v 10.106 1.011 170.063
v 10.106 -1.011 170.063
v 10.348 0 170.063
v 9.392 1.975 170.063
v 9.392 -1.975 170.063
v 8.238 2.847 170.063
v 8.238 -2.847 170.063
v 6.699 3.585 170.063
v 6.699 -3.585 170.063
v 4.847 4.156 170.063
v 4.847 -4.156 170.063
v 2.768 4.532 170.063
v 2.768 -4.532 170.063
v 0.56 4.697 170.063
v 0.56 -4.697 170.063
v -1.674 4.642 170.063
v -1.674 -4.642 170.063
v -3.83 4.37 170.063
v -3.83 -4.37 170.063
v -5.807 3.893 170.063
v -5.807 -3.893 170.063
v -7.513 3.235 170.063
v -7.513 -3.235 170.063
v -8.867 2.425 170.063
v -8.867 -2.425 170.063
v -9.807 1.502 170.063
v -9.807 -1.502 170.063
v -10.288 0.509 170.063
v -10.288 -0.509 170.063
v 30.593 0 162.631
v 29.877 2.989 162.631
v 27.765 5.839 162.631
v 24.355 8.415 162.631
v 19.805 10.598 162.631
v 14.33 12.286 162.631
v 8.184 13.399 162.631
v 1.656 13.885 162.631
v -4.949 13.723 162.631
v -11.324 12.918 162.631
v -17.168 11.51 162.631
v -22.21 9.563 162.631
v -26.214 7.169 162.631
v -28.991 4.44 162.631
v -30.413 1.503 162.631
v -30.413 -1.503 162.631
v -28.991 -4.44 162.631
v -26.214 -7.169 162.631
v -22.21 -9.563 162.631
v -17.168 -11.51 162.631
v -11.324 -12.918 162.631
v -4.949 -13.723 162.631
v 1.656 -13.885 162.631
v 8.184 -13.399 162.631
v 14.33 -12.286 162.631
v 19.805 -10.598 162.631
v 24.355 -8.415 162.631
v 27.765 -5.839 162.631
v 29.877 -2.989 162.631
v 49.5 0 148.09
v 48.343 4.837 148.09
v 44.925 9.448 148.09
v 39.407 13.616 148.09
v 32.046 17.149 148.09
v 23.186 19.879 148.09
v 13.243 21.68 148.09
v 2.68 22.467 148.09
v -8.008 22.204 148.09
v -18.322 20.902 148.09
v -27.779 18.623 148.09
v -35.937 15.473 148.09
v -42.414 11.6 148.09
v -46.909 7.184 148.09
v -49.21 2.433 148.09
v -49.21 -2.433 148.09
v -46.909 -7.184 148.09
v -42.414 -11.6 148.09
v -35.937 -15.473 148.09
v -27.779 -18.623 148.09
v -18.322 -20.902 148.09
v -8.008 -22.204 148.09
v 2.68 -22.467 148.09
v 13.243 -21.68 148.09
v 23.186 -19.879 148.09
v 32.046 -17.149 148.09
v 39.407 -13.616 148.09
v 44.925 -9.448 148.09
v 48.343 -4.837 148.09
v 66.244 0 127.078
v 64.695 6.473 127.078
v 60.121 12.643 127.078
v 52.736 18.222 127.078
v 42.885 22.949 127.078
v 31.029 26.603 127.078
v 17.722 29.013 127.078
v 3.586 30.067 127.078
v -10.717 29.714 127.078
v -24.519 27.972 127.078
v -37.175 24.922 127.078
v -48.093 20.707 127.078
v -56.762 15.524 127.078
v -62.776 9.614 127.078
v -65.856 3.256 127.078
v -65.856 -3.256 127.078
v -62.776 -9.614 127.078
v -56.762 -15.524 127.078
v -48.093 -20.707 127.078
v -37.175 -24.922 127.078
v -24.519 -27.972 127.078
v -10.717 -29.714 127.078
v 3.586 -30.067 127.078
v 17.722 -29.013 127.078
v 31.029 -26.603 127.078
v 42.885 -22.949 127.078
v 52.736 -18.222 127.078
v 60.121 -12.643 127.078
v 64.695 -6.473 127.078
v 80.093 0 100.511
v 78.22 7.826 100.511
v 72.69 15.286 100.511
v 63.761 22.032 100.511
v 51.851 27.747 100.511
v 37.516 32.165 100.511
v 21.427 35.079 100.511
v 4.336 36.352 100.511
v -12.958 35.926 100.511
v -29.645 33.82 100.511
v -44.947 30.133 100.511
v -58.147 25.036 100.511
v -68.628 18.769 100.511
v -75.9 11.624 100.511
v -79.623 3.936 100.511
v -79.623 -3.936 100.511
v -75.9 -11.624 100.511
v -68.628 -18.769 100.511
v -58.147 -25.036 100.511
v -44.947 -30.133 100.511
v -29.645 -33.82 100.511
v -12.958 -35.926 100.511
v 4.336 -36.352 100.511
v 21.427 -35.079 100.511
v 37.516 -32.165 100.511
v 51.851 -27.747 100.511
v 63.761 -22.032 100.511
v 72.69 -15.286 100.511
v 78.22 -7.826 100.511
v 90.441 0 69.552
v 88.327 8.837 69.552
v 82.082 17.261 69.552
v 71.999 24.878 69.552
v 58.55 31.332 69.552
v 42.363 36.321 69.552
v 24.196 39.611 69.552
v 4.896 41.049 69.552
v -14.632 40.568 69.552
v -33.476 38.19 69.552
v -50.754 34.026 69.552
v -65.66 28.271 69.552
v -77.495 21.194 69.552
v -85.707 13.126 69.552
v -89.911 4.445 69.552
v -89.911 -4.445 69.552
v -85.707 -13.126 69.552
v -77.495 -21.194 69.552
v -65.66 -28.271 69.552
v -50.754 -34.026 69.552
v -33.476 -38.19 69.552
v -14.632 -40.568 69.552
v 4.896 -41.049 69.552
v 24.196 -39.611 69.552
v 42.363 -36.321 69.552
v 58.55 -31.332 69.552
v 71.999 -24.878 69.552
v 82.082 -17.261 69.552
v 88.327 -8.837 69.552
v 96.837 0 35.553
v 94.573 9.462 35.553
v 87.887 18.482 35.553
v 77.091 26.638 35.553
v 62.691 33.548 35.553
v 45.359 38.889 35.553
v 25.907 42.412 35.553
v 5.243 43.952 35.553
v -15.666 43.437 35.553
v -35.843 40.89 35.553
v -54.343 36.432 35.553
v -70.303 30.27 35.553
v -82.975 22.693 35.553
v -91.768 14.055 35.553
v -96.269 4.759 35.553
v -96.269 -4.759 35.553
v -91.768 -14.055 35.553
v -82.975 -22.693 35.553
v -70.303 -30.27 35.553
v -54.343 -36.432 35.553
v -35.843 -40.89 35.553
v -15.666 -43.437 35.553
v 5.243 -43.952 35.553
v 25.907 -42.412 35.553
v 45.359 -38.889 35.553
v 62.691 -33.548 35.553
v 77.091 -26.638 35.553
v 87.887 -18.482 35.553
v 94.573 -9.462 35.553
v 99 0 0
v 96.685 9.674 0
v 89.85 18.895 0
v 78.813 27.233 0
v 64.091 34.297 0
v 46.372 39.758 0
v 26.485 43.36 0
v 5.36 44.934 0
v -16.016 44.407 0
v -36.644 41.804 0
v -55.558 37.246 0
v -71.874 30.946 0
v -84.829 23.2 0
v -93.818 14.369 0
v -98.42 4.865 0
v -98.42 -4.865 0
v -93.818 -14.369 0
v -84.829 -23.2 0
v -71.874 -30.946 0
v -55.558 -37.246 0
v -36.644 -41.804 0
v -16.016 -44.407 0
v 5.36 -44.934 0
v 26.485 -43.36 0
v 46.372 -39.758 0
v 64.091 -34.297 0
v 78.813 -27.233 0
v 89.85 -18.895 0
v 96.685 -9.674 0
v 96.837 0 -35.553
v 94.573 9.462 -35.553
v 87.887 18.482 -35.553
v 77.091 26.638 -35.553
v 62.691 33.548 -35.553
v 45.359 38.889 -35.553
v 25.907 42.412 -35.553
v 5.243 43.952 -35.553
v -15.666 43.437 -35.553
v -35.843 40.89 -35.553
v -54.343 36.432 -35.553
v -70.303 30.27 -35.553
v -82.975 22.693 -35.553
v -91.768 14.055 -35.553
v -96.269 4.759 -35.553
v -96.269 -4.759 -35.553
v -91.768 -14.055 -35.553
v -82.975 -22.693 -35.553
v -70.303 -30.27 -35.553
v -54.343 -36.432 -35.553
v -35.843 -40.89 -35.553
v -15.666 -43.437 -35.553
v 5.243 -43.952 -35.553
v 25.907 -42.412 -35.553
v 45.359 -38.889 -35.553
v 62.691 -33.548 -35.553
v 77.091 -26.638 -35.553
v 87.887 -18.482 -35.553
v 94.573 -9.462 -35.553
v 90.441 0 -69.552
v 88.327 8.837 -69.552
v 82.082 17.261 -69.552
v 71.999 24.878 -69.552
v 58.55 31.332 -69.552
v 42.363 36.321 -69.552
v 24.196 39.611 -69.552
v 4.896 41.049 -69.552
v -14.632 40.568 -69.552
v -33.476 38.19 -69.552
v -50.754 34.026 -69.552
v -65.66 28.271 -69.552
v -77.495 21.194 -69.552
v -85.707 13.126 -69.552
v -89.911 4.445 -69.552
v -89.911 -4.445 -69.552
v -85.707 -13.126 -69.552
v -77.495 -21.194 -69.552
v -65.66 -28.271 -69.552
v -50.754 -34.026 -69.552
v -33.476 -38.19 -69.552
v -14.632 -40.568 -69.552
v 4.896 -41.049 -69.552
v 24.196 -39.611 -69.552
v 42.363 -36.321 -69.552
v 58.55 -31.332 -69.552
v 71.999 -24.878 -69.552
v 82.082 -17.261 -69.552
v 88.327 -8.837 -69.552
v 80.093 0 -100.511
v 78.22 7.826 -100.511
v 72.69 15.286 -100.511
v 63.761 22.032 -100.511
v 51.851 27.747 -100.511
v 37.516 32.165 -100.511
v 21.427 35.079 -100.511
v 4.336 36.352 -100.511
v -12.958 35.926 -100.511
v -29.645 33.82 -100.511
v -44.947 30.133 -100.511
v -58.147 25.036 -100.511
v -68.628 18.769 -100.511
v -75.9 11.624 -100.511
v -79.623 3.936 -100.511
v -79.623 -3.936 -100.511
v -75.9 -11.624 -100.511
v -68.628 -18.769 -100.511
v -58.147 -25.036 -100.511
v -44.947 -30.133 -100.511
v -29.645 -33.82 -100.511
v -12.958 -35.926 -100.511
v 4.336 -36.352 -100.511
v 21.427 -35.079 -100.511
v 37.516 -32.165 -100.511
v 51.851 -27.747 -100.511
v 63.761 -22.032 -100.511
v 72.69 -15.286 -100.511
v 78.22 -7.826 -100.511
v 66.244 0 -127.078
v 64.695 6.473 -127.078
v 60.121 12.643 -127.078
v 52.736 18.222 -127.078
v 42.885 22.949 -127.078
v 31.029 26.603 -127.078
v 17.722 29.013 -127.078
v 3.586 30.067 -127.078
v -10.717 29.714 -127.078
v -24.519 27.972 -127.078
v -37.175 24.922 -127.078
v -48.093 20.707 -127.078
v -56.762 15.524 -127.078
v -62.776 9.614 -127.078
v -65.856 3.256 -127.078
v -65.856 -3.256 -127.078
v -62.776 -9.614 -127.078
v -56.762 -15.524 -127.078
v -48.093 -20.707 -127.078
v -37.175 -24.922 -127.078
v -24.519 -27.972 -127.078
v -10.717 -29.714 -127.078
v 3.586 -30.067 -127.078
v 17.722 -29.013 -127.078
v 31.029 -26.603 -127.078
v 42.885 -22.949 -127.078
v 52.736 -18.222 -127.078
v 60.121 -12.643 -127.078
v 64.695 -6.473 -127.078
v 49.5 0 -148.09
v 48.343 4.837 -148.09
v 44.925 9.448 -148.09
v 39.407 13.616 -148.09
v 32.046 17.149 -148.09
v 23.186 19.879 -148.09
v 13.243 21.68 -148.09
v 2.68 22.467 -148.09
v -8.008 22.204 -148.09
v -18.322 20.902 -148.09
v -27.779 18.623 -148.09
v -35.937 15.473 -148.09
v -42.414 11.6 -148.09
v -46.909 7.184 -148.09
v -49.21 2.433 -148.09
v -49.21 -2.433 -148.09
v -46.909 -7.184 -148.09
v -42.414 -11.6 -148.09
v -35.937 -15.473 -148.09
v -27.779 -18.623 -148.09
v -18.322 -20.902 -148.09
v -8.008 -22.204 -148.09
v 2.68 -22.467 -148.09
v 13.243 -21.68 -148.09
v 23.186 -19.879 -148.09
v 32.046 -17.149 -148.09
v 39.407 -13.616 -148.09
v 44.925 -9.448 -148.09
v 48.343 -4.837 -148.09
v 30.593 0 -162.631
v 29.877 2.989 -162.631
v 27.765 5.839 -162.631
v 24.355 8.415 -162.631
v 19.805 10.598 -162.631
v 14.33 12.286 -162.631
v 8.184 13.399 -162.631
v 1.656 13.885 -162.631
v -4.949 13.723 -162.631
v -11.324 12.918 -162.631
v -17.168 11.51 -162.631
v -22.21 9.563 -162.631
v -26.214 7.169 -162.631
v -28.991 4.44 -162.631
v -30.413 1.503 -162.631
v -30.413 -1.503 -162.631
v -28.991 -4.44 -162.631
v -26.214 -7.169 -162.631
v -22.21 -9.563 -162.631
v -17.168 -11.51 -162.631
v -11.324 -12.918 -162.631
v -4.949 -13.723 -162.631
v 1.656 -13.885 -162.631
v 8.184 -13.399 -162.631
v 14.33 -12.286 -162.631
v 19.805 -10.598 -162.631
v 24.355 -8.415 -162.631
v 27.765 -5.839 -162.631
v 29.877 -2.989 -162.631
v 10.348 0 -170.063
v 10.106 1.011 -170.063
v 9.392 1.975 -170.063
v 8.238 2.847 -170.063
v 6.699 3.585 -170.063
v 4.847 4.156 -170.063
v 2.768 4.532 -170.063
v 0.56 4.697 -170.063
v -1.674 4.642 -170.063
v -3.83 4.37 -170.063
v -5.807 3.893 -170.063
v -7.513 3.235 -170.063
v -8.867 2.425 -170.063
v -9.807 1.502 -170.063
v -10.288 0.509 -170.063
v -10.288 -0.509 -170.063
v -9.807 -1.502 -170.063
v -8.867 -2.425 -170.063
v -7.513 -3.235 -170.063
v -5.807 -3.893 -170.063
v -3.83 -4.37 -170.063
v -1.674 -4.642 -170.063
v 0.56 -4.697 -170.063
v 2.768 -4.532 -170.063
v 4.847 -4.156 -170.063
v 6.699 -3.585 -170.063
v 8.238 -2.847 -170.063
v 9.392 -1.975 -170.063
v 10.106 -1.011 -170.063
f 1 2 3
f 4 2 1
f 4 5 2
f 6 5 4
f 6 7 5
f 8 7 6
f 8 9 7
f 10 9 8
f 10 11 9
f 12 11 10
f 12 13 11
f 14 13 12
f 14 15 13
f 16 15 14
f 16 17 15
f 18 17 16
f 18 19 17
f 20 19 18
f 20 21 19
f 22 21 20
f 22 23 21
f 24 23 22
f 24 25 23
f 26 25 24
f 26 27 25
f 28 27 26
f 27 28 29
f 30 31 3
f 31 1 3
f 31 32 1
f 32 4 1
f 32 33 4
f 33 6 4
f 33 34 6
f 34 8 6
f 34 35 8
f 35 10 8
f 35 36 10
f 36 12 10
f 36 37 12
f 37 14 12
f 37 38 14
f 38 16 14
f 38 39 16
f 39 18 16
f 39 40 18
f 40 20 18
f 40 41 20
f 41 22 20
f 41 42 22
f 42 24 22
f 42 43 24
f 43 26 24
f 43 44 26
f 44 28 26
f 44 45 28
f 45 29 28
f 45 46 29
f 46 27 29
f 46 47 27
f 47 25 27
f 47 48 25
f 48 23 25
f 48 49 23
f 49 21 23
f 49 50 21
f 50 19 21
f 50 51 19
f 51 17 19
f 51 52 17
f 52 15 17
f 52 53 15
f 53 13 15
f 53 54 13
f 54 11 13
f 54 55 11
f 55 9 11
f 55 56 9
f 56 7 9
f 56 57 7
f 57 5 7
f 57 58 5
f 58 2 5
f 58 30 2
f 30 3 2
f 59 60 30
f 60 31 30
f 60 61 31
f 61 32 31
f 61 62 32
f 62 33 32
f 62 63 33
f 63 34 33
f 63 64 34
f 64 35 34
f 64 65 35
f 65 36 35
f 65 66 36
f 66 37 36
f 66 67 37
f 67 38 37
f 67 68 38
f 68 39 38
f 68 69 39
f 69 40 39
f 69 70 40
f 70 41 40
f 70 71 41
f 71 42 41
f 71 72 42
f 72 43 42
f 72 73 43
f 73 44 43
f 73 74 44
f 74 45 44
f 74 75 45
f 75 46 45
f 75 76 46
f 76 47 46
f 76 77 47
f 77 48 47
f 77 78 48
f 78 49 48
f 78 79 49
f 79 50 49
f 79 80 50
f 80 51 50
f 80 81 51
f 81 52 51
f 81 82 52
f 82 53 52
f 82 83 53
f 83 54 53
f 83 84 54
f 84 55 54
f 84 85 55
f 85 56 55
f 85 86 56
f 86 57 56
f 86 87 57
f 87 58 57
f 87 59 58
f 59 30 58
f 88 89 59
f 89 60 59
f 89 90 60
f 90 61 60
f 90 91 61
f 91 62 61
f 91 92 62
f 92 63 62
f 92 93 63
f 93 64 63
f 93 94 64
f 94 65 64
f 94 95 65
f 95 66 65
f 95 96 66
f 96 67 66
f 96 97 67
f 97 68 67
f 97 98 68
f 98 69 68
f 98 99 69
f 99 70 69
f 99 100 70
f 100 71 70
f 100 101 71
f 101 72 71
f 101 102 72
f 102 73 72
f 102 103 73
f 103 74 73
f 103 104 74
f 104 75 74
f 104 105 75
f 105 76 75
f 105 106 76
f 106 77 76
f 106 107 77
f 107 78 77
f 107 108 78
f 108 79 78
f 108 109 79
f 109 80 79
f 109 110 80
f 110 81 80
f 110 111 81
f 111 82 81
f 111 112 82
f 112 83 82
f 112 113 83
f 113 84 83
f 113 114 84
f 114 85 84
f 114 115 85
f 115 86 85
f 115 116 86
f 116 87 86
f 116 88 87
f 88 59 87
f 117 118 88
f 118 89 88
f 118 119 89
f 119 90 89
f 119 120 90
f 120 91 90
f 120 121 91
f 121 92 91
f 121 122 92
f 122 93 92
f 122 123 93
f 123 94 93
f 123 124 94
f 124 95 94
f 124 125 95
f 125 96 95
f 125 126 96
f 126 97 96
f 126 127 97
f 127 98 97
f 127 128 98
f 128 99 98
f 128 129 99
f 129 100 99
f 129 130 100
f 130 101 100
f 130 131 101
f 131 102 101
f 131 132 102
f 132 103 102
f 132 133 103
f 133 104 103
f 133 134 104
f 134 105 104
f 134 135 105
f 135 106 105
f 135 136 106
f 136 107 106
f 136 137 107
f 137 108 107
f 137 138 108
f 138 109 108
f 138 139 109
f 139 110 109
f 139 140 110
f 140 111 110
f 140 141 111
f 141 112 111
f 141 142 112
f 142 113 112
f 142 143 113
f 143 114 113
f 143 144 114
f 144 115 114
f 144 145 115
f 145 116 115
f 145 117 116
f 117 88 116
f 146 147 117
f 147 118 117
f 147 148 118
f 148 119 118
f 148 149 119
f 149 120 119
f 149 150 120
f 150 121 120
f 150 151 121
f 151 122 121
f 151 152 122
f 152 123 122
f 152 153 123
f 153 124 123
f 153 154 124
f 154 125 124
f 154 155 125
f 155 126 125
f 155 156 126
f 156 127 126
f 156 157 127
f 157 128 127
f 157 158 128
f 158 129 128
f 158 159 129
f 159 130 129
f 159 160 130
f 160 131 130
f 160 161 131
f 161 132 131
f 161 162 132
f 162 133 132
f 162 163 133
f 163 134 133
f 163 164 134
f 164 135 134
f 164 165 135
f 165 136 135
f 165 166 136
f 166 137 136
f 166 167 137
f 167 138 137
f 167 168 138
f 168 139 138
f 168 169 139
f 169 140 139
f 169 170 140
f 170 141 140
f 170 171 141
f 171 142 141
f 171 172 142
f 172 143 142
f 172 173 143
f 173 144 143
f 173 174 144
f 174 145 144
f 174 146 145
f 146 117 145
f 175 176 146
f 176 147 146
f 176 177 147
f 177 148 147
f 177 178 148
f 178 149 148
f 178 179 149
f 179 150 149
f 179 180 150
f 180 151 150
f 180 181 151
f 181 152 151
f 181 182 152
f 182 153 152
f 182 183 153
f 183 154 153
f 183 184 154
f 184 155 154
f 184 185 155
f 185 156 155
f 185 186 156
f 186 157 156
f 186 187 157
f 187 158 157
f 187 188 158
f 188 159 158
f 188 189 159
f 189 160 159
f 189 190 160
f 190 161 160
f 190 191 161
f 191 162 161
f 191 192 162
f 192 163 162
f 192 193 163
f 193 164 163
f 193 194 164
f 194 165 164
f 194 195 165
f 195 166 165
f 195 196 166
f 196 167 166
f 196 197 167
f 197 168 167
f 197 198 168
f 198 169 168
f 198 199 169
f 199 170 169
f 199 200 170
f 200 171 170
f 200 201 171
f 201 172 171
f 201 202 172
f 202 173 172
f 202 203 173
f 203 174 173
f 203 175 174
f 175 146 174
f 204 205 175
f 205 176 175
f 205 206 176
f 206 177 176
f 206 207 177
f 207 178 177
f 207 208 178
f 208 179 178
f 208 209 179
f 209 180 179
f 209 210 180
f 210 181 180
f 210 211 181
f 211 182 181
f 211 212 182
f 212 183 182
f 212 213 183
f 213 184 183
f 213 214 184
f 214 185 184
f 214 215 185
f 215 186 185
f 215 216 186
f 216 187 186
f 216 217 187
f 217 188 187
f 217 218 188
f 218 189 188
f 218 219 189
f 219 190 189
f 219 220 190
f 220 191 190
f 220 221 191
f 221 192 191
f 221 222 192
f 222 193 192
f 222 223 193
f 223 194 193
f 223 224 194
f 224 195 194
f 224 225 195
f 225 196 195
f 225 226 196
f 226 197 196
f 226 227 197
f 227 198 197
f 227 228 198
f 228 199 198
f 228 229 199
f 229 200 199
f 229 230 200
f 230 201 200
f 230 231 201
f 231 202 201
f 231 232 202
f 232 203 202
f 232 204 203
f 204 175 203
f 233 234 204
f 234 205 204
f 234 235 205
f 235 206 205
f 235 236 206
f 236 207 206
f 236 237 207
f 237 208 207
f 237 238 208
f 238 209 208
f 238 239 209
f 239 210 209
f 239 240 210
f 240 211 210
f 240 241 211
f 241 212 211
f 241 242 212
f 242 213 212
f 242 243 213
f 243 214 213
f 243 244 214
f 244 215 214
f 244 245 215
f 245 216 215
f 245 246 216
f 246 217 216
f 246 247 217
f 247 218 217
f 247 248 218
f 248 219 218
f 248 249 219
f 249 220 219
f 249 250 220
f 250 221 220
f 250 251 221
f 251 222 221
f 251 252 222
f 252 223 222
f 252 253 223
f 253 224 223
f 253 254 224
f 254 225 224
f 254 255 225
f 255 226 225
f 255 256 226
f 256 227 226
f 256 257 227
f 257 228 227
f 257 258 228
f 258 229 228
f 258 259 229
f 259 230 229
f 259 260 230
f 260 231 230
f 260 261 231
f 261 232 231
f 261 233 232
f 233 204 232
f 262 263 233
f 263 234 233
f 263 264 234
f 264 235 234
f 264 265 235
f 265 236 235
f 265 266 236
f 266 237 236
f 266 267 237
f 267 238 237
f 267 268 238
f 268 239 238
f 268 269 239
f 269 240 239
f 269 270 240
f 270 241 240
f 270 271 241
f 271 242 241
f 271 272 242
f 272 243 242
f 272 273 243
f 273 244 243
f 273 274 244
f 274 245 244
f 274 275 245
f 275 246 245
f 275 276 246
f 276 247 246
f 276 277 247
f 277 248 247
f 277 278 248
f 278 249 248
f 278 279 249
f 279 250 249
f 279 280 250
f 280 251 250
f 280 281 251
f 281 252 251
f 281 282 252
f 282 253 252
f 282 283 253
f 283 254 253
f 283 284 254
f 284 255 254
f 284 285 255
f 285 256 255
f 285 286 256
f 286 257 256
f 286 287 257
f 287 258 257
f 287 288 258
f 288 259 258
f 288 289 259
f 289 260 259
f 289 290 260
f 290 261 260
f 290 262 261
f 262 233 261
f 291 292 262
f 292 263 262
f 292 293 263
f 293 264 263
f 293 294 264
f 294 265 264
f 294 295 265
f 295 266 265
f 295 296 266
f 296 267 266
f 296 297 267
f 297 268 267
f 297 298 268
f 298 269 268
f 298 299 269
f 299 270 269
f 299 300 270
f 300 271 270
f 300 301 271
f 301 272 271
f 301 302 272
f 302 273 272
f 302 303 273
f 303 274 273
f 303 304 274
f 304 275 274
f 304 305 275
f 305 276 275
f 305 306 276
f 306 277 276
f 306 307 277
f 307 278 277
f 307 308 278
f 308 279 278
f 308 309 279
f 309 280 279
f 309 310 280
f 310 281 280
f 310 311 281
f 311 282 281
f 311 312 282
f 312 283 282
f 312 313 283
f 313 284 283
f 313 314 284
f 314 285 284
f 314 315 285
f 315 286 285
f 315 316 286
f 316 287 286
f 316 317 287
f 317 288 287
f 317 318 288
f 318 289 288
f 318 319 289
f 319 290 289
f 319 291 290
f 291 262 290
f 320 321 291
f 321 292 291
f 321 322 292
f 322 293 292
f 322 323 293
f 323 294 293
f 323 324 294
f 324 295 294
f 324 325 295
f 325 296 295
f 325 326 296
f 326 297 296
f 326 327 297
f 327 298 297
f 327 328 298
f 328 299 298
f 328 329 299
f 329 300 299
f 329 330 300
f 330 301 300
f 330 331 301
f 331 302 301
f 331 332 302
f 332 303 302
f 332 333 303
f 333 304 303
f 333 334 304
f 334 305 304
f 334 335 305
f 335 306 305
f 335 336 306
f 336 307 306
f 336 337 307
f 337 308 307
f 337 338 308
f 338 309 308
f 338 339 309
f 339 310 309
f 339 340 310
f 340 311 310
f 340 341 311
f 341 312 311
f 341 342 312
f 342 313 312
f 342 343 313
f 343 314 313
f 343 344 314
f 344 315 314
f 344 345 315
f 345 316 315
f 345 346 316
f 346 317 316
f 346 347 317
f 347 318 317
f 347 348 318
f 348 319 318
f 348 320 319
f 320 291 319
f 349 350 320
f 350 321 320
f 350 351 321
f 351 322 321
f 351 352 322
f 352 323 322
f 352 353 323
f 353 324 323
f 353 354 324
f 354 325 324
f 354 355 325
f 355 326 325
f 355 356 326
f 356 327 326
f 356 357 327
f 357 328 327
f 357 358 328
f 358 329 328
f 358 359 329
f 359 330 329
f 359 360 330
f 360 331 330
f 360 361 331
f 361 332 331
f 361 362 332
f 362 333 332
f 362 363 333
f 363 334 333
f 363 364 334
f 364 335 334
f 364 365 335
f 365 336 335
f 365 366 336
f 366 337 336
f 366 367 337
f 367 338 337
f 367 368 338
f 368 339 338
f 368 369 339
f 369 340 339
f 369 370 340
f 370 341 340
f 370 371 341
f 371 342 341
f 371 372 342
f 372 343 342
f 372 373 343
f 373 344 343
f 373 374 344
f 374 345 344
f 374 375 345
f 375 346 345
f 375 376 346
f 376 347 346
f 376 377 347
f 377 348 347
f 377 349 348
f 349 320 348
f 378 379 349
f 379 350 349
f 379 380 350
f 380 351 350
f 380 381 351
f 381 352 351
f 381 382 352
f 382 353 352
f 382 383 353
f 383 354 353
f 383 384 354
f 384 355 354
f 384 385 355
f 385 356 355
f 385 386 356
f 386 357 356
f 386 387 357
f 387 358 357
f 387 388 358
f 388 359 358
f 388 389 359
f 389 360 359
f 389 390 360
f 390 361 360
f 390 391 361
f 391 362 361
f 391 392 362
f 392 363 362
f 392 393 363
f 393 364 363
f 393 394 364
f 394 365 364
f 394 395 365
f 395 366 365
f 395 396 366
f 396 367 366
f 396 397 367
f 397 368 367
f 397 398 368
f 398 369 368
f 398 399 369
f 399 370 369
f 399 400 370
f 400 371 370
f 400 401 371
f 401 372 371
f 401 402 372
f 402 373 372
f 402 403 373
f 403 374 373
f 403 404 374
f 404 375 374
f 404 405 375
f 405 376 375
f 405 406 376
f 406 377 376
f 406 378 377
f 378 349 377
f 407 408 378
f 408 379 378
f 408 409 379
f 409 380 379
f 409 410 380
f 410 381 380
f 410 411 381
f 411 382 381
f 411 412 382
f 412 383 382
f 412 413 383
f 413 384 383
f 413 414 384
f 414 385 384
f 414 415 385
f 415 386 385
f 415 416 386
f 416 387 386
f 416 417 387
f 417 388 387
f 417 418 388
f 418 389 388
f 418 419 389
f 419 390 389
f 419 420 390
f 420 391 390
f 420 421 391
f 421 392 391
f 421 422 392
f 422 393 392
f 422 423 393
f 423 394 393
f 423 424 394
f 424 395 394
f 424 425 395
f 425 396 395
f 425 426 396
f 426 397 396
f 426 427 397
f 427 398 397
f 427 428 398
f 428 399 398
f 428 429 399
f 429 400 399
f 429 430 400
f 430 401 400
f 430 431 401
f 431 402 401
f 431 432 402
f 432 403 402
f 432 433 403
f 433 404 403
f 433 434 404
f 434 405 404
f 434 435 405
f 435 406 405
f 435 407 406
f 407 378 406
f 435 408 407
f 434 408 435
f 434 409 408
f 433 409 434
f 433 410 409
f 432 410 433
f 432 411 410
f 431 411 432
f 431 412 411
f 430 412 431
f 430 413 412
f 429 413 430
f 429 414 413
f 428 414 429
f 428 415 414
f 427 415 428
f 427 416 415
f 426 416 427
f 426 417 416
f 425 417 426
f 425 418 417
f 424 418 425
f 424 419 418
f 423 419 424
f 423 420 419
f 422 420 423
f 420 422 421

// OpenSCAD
// Generated by SolidPython 1.0.1 on 2020-07-29 00:46:49


scale(v = [11, 5, 19]) {
	sphere(r = 9);
}
/***********************************************
*********      SolidPython code:      **********
************************************************
 
# import packages: SolidPython
from solid import *
from solid.utils import *
from itertools import chain, combinations, permutations


class Resize:

    def __init__(self, scad_file):
        self.scad_file = scad_file
        #self.scad_file = import_scad(scad_file)
        # cone/cylinder param:
        self.r1 = 0
        self.r2 = 0
        self.h = 0
        # rectangular prism param:
        self.w = 0
        self.l = 0
        # ellipse param:
        self.r = 0

    # import OpenScad code (file name corresponds to shape)


    # classify shape + parameters
    def assign(self, param1, param2, param3):
        if self.scad_file == 'cone.scad':
            self.r1 = param1
            self.r2 = param2
            self.h = param3
        elif self.scad_file == 'cylinder.scad':
            self.r1 = param1
            self.r2 = param2
            self.h = param3
        elif self.scad_file == 'rectangularPrism.scad':
            self.h = param1
            self.l = param2
            self.w = param3
        else:
            self.r = param1
            self.h = param2

    # resize parameters
    def iterate(self):
        x = range(3, 20, 2)
        i = 1
        if self.scad_file == 'cone.scad':
            tempList = list(permutations(x, 2))
            for temp in tempList:
                param1 = temp[0]
                param2 = temp[1]
                filepath = 'produced_scad_files/' + 'cone' + str(param1) + '_' + str(param2) + '_' + '.scad'
                scad_render_to_file(cylinder(h=param1, r1=param2, r2=0), filepath)

        elif self.scad_file == 'cylinder.scad':
            tempList = list(permutations(x, 3))
            for temp in tempList:
                param1 = temp[0]
                param2 = temp[1]
                filepath = 'produced_scad_files/' + 'cylinder' + str(param1) + '_' + str(param2) + '_' + '.scad'
                scad_render_to_file(cylinder(h=param1, r1=param2, r2=param2), filepath)

        elif self.scad_file == 'rectangularPrism.scad':
            tempList = list(permutations(x, 3))
            for temp in tempList:
                param1 = temp[0]
                param2 = temp[1]
                param3 = temp[2]
                filepath = 'produced_scad_files/' + 'rectangularPrism' + str(param1) + '_' + str(param2) + '_' + str(
                    param3) + '.scad'
                scad_render_to_file(cube(size=(param1, param2, param3)), filepath)

        elif self.scad_file == 'ellipse.scad':
            tempList = list(permutations(x, 4))
            for temp in tempList:
                param1 = temp[0]
                param2 = temp[1]
                param3 = temp[2]
                param4 = temp[3]
                filepath = 'produced_scad_files/' + 'ellipse' + str(param1) + '_' + str(param2) + '_' + str(param3) + '_' + str(param4) + '.scad'
                scad_render_to_file(scale([param1, param2, param3])(sphere(r=param4)), filepath)

    def render_to_scadfile(self):
        scad_render_to_file(scad, 'example.scad') 
 
************************************************/
